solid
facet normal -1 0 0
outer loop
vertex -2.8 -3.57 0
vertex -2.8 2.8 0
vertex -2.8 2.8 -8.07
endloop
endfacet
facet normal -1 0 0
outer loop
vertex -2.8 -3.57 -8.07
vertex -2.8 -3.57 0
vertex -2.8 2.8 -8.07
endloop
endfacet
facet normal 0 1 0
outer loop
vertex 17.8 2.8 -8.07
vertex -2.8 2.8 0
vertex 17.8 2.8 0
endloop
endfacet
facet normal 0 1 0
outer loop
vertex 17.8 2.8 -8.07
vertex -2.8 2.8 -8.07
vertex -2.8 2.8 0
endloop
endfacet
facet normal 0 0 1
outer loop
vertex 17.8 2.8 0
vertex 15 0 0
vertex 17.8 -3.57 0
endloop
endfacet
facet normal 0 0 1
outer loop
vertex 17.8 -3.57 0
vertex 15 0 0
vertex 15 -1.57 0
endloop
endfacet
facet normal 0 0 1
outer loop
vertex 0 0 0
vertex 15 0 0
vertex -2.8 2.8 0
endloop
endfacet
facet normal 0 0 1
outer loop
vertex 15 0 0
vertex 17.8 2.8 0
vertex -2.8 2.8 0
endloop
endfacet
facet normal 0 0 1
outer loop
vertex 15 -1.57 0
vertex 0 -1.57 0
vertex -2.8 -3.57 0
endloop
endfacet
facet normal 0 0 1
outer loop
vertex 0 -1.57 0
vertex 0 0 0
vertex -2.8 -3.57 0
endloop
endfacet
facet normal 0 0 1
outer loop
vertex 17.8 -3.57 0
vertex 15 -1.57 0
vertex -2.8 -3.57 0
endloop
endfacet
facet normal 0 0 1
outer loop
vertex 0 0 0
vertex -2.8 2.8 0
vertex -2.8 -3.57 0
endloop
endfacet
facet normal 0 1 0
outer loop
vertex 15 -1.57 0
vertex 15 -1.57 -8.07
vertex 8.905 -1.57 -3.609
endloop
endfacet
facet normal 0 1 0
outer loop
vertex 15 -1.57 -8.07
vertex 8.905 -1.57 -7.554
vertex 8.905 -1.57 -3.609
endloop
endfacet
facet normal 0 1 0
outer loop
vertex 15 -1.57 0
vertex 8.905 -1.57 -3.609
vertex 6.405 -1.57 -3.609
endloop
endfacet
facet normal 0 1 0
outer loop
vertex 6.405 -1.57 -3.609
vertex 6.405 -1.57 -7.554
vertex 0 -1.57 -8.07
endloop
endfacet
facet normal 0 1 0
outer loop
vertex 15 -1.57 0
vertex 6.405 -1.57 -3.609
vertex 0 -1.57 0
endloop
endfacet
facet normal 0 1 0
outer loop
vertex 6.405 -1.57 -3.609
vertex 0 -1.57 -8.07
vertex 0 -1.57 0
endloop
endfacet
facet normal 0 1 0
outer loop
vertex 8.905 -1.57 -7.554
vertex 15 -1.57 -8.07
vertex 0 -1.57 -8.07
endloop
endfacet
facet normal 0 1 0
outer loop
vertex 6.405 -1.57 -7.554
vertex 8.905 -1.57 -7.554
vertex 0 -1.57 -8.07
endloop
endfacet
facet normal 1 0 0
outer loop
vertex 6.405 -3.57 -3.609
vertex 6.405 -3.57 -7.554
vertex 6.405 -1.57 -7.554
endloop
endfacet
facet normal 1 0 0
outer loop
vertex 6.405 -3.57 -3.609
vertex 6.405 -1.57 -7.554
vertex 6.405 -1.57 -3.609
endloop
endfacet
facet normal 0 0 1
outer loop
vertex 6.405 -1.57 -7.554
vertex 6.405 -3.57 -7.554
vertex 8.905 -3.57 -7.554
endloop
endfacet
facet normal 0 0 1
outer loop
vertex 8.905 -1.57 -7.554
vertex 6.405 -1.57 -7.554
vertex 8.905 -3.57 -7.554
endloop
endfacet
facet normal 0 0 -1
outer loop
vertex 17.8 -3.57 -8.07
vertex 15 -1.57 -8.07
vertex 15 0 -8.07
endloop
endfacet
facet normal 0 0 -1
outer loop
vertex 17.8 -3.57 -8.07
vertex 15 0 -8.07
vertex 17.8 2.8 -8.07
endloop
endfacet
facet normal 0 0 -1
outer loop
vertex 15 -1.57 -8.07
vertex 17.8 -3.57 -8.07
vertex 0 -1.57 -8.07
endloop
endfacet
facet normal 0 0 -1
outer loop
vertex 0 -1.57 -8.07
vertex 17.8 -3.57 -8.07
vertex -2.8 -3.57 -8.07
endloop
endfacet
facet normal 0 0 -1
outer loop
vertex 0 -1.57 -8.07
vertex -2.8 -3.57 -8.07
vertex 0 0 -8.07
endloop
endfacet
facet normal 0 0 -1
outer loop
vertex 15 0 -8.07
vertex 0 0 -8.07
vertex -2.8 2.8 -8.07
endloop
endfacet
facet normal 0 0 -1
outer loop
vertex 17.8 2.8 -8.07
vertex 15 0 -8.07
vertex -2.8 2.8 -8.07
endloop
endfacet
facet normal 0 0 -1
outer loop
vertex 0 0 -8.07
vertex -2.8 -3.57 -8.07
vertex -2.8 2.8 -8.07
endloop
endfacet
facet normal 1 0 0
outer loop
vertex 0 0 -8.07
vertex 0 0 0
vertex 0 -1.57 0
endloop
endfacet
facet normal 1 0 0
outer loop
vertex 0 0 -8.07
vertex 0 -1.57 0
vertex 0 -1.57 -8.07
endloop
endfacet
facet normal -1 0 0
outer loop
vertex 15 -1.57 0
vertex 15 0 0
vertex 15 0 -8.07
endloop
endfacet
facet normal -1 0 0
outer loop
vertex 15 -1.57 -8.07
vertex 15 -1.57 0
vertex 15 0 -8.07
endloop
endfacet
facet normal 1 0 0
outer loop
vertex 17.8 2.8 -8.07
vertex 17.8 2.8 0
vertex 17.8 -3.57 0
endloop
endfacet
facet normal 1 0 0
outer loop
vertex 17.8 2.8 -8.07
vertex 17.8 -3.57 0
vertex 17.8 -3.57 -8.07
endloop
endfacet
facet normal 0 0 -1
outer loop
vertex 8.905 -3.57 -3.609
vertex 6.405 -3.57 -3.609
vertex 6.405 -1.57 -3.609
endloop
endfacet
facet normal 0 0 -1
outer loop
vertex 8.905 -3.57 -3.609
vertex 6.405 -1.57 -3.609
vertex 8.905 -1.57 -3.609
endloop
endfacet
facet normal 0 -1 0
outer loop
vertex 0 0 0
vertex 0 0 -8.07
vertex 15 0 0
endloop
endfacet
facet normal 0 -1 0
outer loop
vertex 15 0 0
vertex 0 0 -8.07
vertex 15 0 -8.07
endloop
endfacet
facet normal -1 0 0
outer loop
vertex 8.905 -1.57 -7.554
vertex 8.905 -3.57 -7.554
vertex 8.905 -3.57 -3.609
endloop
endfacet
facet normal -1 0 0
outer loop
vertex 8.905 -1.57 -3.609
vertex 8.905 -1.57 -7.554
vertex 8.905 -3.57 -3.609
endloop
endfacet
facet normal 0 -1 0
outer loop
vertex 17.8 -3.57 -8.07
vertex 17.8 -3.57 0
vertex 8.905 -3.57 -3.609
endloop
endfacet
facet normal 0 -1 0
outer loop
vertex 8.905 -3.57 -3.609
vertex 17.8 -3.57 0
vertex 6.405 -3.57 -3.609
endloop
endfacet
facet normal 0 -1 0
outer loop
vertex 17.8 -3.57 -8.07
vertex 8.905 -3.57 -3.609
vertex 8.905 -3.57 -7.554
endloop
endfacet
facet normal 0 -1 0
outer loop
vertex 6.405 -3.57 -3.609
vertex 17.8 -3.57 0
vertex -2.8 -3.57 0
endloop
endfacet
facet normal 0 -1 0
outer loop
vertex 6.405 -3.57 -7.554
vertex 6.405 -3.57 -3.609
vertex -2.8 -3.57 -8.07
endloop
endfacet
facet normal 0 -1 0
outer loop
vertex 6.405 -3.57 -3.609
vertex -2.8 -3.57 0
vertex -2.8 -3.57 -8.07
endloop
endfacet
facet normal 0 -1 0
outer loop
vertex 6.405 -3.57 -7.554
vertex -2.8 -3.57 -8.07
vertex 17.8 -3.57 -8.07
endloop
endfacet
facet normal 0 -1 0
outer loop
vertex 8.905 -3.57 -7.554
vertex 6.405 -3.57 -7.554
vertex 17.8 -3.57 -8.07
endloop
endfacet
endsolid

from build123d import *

# Parameters (mm, degrees)
ESQUISSE1_W             = 15
ESQUISSE1_H             = 8.07
BOSS_EXTRU_1_DEPTH      = 2.8
ESQUISSE4_W             = 2.8
ESQUISSE4_H             = 8.07
BOSS_EXTRU_3_DEPTH      = 6.37
BOSS_EXTRU_4_DEPTH      = 15
ESQUISSE6_W             = 2.5
ESQUISSE6_H             = 3.945
ENL_V_MAT_EXTRU_1_DEPTH = 3


with BuildPart() as part:
    # Esquisse1 → Boss.-Extru.1 (new body)
    with BuildSketch(Plane(origin=(0, 0, 0), x_dir=(1, 0, 0), z_dir=(0, 1, 0))):
        with Locations((7.5, 4.035)):
            Rectangle(ESQUISSE1_W, ESQUISSE1_H)
    extrude(amount=BOSS_EXTRU_1_DEPTH)

    # Esquisse4 → Boss.-Extru.3 (add)
    with BuildSketch(Plane(origin=(0, 2.8, 0), x_dir=(1, 0, 0), z_dir=(0, 1, 0))):
        with Locations((16.4, 4.035)):
            Rectangle(ESQUISSE4_W, ESQUISSE4_H)
        with Locations((-1.4, 4.035)):
            Rectangle(ESQUISSE4_W, ESQUISSE4_H)
    extrude(amount=-BOSS_EXTRU_3_DEPTH)

    # Esquisse5 → Boss.-Extru.4 (add)
    with BuildSketch(Plane(origin=(0, 0, 0), x_dir=(0, 0, -1), z_dir=(1, 0, 0))):
        Polygon((8.07, -3.57), (8.07, -1.57), (5.52241552, -1.57), (0, -1.57), (0, -3.57), align=None)
    extrude(amount=BOSS_EXTRU_4_DEPTH)

    # Esquisse6 → Enlèv. mat.-Extru.1 (cut)
    with BuildSketch(Plane.XZ.offset(3.57)):
        with Locations((7.655, -5.581368507)):
            Rectangle(ESQUISSE6_W, ESQUISSE6_H)
    extrude(amount=-ENL_V_MAT_EXTRU_1_DEPTH, mode=Mode.SUBTRACT)


solid = part.part
